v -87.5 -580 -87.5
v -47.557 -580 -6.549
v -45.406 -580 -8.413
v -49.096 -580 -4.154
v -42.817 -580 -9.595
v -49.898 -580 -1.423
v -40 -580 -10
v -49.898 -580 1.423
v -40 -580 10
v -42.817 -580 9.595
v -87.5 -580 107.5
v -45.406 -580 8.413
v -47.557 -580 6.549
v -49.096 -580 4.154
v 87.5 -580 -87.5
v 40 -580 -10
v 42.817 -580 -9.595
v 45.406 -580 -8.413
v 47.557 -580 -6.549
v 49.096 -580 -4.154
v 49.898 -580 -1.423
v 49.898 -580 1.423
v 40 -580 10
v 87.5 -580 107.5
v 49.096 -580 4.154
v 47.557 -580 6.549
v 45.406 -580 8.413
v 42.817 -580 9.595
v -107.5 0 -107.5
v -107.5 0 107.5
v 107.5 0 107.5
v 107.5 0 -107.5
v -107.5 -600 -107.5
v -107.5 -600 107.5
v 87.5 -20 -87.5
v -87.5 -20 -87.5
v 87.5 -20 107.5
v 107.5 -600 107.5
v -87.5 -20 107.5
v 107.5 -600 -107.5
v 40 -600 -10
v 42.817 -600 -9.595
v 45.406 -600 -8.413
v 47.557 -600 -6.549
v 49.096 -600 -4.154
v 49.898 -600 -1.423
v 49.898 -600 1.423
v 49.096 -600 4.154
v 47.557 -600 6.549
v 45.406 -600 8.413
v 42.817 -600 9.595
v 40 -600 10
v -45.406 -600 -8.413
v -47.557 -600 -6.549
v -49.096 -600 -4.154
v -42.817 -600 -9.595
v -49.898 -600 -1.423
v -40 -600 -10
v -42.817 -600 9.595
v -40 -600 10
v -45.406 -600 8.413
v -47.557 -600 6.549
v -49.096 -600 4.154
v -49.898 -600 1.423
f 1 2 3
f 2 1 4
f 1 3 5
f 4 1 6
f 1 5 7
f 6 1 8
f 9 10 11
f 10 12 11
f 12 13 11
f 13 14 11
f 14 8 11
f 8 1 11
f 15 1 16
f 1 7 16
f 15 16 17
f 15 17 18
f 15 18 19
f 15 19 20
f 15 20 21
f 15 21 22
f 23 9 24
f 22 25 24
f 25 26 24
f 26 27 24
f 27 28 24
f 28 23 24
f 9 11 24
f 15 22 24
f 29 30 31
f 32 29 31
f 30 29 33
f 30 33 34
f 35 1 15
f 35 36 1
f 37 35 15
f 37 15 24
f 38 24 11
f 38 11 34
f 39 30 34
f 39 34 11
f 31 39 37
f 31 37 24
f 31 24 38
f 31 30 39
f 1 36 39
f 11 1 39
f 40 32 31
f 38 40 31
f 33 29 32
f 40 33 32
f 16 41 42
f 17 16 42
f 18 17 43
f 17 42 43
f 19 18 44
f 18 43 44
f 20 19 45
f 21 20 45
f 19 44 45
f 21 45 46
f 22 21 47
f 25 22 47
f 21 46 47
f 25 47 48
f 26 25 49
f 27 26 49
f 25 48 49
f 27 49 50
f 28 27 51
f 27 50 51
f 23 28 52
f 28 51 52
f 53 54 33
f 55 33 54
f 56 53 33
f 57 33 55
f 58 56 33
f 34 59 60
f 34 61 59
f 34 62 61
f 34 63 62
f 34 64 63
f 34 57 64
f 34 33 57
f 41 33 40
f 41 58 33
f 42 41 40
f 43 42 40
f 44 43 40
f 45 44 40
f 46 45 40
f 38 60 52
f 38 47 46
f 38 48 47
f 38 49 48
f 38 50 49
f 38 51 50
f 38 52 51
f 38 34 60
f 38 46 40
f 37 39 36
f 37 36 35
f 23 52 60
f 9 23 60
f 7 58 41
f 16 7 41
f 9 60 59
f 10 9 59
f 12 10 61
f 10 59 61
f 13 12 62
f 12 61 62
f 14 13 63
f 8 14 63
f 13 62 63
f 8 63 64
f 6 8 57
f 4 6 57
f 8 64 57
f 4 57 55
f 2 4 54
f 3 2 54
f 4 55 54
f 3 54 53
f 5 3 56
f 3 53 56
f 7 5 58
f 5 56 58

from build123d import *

# Parameters (mm, degrees)
F0_W     = 215
F0_H     = 215
F1_DEPTH = 600
F2_T     = -20
F4_DEPTH = 20


with BuildPart() as f1:
    # F0 (on Front) → F1 (new body)
    with BuildSketch(Plane.XZ):
        Rectangle(F0_W, F0_H)
    extrude(amount=F1_DEPTH)

    # F2
    f2_openings = [f1.faces().sort_by_distance(p)[0] for p in [
        (0, -300, 107.5),
    ]]
    offset(amount=F2_T, openings=f2_openings)

    # F3 (on face) → F4 (cut, through all)
    with BuildSketch(Plane.XZ.offset(600)):
        with BuildLine():
            Line((-40, -10), (40, -10))
            ThreePointArc((40, -10), (50, 0), (40, 10))
            Line((40, 10), (-40, 10))
            ThreePointArc((-40, 10), (-50, 0), (-40, -10))
        make_face()
    extrude(amount=-F4_DEPTH, mode=Mode.SUBTRACT)


solid = f1.part
